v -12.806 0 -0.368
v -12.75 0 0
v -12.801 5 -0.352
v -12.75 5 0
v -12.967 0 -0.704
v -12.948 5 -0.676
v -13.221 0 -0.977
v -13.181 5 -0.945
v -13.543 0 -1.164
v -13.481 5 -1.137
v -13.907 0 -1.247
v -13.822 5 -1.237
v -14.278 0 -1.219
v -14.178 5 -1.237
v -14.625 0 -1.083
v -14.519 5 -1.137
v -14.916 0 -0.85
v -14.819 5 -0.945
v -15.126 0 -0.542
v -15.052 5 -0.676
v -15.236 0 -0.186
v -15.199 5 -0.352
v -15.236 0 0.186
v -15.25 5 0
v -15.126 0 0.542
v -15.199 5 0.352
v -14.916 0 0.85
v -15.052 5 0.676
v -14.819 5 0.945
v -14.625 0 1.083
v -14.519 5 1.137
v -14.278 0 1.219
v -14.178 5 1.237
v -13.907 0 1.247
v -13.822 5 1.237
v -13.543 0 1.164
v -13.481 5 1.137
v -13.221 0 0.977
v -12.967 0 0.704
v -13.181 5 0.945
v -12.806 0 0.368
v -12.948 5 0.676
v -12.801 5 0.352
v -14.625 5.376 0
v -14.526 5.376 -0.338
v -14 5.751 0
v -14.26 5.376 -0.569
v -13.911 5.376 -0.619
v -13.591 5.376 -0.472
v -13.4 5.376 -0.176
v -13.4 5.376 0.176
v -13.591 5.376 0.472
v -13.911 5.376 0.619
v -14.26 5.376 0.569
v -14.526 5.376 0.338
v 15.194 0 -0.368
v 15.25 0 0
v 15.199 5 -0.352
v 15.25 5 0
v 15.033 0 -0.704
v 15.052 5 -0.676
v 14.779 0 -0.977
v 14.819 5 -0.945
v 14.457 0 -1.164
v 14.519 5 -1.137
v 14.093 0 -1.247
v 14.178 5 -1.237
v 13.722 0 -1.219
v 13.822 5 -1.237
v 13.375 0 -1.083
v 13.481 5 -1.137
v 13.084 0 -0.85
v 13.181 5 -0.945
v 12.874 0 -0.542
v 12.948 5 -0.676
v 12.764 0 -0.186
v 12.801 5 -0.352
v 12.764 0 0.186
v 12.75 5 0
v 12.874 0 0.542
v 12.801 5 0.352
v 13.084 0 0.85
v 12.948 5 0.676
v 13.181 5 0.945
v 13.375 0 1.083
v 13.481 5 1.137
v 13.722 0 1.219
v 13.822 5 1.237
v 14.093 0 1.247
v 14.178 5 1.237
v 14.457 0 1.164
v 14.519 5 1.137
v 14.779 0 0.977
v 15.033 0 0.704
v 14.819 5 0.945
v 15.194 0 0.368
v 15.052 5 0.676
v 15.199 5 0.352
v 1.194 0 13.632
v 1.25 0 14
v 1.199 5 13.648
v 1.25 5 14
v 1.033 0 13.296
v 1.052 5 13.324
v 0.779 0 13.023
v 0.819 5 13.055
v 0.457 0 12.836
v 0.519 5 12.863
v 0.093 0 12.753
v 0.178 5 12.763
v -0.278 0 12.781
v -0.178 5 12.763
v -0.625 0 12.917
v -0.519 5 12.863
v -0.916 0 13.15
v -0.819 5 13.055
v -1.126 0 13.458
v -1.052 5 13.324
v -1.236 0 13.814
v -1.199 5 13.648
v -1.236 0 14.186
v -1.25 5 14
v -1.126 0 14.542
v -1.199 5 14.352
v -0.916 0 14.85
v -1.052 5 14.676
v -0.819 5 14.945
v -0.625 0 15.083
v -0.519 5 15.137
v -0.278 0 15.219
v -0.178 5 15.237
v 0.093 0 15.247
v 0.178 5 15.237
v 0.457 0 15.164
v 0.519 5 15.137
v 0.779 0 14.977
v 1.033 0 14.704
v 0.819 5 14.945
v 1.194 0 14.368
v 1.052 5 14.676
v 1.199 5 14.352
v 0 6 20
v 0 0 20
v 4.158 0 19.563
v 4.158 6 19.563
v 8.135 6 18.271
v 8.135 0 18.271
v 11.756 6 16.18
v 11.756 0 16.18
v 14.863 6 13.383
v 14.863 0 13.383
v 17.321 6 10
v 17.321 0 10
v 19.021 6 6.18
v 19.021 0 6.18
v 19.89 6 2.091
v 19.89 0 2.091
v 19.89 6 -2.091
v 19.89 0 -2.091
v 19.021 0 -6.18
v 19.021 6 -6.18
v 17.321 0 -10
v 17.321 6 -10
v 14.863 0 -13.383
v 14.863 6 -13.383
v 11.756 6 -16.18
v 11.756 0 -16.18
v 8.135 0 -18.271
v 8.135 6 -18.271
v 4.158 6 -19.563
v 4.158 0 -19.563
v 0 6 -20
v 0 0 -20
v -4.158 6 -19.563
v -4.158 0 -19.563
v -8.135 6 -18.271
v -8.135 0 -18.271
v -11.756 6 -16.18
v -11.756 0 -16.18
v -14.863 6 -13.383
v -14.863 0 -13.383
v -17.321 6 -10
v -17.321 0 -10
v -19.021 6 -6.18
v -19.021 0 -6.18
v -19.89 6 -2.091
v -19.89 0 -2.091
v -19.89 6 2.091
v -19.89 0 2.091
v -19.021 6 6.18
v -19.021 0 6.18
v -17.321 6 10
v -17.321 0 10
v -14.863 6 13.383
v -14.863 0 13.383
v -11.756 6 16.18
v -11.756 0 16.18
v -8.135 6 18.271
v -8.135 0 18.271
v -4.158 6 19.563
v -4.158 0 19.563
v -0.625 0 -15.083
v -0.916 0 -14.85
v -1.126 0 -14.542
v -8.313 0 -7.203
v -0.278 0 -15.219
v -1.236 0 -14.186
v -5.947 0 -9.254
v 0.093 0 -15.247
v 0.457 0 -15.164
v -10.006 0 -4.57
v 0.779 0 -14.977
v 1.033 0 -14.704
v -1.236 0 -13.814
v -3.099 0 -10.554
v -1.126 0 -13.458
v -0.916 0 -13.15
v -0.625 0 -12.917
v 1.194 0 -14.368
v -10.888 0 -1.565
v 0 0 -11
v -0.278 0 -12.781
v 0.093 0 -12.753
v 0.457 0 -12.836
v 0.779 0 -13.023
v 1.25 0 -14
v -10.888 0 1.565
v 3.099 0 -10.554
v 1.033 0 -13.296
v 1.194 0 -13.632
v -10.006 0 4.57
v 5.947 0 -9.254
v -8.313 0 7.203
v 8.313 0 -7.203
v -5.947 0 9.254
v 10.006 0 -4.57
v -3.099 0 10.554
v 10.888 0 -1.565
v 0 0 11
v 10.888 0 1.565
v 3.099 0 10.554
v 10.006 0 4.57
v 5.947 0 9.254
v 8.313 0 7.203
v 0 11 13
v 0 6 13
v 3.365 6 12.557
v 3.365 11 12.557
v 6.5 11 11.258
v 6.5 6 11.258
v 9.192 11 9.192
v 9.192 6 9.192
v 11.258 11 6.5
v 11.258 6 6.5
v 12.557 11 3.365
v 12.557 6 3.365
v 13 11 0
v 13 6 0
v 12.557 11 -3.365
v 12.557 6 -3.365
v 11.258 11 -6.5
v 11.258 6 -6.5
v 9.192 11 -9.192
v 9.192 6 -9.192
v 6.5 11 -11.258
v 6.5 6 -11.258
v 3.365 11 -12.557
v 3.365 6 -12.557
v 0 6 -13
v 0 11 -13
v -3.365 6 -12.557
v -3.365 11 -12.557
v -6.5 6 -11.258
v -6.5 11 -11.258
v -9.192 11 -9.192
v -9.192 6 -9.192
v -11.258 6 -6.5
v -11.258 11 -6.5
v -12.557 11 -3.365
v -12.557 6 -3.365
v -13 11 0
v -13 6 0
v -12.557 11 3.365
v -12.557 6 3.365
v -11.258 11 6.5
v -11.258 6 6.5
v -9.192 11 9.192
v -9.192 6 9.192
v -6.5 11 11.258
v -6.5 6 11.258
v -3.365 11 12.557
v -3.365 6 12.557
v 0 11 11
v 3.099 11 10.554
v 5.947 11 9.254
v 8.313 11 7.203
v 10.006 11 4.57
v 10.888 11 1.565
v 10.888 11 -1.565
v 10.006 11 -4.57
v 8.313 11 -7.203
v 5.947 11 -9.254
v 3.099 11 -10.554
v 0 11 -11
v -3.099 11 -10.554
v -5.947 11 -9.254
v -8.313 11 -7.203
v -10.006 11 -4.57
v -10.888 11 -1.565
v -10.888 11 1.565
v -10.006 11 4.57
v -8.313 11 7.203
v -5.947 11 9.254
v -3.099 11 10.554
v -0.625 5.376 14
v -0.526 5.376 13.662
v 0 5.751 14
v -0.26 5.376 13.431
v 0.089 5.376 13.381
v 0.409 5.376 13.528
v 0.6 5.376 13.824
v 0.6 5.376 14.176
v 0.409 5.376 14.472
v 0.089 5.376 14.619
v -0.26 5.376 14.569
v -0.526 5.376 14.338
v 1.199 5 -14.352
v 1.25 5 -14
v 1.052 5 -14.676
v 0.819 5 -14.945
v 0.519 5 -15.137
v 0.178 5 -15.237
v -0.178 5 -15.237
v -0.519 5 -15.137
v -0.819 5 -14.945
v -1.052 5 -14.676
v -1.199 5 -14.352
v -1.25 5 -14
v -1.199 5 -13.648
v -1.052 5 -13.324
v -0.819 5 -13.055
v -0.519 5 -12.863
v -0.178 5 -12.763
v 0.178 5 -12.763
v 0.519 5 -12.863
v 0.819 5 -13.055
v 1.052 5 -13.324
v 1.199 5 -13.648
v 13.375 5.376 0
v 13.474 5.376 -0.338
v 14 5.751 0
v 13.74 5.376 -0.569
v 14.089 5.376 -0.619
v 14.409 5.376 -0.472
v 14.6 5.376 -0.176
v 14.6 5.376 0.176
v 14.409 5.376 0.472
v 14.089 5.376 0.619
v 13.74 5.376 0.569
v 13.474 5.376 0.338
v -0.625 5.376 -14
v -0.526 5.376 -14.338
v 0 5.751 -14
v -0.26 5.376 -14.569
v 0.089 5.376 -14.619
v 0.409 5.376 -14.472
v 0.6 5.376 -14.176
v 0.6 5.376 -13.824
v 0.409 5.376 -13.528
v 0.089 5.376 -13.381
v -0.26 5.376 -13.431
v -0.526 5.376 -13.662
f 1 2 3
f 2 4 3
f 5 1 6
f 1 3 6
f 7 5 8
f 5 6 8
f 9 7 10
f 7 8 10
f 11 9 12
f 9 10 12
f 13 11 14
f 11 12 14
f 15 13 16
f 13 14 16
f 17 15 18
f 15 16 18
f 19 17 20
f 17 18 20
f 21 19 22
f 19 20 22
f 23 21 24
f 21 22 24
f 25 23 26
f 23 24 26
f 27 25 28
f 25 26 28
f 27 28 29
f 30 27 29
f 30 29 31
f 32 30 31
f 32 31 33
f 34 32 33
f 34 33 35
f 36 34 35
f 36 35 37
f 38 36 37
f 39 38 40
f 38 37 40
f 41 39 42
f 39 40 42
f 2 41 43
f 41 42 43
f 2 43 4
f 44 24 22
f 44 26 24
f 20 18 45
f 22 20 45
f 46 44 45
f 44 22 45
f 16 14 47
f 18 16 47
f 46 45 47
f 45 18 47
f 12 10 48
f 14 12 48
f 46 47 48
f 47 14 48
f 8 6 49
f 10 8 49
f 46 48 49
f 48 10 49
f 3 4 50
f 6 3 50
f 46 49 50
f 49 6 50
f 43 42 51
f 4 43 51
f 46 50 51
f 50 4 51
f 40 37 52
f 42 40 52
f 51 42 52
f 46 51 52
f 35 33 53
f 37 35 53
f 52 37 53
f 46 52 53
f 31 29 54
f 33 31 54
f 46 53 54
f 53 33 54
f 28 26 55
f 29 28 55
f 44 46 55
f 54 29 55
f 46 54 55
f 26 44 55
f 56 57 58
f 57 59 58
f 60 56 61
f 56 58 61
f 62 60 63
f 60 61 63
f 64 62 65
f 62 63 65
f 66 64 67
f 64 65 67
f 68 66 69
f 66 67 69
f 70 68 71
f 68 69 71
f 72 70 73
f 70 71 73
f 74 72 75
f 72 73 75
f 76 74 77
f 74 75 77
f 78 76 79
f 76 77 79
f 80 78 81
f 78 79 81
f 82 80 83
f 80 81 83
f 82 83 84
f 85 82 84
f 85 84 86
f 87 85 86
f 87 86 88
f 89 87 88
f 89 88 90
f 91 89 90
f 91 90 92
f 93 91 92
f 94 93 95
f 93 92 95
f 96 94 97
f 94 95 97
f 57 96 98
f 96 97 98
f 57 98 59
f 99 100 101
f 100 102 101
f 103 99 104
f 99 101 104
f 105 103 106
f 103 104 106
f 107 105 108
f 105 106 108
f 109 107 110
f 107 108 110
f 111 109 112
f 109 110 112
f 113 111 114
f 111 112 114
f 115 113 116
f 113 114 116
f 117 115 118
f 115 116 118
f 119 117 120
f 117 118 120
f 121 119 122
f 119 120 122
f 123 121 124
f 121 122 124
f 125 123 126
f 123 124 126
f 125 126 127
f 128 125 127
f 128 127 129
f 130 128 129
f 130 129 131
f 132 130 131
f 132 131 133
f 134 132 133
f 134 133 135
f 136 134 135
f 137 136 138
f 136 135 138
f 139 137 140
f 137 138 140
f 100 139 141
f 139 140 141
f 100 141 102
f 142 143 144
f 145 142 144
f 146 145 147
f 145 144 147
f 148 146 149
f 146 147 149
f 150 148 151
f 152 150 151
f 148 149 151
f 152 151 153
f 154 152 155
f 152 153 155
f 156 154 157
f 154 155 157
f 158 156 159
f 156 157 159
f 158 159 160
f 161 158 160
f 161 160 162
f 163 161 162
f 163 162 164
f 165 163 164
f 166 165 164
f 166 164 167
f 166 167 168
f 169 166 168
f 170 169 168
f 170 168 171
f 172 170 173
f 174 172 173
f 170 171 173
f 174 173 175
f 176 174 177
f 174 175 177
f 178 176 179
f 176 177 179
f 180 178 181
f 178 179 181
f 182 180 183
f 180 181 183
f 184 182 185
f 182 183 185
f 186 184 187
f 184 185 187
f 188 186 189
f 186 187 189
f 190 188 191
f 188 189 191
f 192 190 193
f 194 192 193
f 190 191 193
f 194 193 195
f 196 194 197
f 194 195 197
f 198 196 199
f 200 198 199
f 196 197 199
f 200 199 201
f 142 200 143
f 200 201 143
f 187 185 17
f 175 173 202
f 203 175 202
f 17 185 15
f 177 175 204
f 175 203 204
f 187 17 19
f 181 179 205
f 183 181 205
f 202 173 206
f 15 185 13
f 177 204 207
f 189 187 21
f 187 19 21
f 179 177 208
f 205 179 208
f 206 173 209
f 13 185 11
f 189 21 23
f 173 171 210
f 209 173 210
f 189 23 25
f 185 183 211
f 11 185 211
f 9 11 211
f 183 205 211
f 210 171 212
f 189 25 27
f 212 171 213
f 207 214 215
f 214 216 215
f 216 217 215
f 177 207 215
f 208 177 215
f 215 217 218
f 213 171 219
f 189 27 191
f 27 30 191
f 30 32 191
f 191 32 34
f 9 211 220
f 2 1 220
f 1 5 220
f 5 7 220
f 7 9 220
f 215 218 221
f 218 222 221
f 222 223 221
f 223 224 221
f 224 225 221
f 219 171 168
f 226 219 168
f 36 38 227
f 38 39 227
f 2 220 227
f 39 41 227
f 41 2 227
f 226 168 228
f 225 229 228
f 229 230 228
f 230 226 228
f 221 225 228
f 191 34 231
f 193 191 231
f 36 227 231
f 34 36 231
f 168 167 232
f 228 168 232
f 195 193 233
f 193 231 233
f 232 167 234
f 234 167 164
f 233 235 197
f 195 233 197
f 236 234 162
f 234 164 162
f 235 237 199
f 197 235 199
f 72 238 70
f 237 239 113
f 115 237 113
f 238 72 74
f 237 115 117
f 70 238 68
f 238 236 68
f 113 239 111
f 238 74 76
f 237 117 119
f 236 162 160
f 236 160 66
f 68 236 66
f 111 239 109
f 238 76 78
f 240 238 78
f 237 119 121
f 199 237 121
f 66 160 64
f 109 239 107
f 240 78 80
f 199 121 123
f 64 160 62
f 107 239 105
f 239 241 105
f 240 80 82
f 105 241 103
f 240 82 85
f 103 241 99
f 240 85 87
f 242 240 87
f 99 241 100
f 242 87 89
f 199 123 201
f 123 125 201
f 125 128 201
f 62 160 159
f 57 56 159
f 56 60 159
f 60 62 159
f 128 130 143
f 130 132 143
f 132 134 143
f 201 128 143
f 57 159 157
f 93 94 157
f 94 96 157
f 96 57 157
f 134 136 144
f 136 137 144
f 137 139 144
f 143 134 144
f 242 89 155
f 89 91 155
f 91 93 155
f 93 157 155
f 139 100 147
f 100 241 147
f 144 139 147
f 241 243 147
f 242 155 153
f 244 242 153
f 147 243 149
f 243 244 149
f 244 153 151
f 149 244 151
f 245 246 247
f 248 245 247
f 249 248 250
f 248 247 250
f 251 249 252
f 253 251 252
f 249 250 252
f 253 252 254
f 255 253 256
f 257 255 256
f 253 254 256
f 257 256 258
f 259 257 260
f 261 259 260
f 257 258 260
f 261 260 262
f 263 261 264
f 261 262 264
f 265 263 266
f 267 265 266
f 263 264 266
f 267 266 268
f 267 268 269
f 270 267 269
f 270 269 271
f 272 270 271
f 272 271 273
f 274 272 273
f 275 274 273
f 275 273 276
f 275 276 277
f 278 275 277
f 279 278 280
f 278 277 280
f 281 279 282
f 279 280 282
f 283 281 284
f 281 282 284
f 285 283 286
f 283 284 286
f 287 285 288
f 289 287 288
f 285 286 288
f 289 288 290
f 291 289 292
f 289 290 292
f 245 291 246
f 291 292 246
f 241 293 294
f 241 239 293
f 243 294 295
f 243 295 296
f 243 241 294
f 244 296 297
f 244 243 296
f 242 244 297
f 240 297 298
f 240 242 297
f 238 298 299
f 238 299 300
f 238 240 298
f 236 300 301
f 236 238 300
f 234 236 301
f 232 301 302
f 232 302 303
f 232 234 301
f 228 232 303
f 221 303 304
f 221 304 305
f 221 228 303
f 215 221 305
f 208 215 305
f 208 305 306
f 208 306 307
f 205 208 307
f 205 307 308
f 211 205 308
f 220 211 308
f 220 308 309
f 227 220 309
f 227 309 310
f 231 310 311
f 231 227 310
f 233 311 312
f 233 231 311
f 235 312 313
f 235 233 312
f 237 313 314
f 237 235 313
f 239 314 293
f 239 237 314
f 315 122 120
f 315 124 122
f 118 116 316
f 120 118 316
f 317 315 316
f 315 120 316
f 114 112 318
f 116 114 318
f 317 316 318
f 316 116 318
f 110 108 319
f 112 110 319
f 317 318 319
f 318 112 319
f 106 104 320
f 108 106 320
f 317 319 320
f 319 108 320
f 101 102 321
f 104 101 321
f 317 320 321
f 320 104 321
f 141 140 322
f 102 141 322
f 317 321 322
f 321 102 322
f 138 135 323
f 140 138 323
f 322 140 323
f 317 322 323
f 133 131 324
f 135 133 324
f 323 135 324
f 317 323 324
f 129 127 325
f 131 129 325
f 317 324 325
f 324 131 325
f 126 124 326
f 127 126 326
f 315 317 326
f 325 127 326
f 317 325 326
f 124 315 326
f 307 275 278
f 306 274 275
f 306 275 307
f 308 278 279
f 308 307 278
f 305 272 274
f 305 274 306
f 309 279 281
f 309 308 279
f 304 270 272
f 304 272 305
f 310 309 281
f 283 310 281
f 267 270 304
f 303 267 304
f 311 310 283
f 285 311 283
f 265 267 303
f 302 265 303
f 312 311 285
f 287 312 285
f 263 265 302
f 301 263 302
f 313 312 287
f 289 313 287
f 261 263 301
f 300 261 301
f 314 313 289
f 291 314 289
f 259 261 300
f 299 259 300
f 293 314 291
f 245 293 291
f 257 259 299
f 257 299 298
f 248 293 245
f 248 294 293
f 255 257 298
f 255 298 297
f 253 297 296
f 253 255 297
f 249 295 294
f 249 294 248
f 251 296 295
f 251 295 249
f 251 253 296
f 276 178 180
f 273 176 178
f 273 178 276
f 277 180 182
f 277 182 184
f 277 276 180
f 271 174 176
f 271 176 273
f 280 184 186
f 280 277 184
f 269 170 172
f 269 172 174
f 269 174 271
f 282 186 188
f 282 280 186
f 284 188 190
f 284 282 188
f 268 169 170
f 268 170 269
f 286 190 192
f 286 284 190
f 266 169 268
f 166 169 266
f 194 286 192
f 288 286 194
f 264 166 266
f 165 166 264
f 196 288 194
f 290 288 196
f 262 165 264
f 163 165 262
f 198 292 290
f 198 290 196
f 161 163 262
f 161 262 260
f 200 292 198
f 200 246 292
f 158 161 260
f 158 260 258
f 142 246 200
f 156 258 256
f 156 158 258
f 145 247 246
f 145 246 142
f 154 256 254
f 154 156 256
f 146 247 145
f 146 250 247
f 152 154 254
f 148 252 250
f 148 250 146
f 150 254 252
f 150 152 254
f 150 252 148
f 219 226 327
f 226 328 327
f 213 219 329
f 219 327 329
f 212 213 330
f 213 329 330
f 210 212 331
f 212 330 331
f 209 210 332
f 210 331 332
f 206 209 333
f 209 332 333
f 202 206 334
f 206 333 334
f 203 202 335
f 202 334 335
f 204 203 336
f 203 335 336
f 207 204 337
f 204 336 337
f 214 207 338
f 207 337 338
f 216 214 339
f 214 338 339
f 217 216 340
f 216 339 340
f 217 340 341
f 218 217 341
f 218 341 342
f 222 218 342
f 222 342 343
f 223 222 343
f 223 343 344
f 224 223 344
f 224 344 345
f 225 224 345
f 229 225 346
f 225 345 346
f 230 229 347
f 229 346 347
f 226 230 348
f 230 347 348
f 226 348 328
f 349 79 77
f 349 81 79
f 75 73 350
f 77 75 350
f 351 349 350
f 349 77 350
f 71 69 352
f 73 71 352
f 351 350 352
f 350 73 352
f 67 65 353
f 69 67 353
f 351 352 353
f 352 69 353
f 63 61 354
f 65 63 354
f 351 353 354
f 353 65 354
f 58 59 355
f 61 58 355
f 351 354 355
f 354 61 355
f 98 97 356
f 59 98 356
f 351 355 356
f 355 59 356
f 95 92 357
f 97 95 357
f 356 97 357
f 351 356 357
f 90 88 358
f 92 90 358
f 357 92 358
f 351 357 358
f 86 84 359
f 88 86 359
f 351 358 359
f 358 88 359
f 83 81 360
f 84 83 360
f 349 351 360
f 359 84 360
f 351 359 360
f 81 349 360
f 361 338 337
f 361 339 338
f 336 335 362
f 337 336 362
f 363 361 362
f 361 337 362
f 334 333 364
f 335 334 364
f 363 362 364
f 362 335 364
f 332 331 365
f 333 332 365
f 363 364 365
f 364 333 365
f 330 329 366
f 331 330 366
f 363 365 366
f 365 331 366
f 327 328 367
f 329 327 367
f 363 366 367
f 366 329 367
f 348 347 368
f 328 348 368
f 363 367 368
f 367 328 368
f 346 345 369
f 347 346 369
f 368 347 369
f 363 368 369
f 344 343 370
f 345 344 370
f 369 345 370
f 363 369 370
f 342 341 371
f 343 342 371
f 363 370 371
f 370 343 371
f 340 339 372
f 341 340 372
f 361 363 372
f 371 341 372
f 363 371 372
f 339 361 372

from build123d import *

# Parameters (mm, degrees)
SKETCH_1_R             = 20
SKETCH_1_R_2           = 11
EXTRUDE_1_DEPTH        = 6
SKETCH_2_R             = 13
SKETCH_2_R_2           = 11
EXTRUDE_2_DEPTH        = 5
HOLE_WIZARD_M3_1_D     = 2.5
HOLE_WIZARD_M3_1_DEPTH = 5
HOLE_WIZARD_M3_1_TIP   = 0.751075774


with BuildPart() as part:
    # 草图1 → 凸台-拉伸1 (new body)
    with BuildSketch(Plane(origin=(0, 0, 0), x_dir=(1, 0, 0), z_dir=(0, 1, 0))):
        with Locations(Location((0, 0, 0), (0, 0, 270))):
            Circle(SKETCH_1_R)
        with Locations(Location((0, 0, 0), (0, 0, 270))):
            Circle(SKETCH_1_R_2, mode=Mode.SUBTRACT)
    extrude(amount=EXTRUDE_1_DEPTH)

    # 草图2 → 凸台-拉伸2 (add)
    with BuildSketch(Plane(origin=(0, 6, 0), x_dir=(1, 0, 0), z_dir=(0, 1, 0))):
        with Locations(Location((0, 0, 0), (0, 0, 270))):
            Circle(SKETCH_2_R)
        with Locations(Location((0, 0, 0), (0, 0, 270))):
            Circle(SKETCH_2_R_2, mode=Mode.SUBTRACT)
    extrude(amount=EXTRUDE_2_DEPTH)

    # M3 螺纹孔1
    with Locations(Plane(origin=(0, 0, 0), x_dir=(-1, 0, 0), z_dir=(0, -1, 0))):
        with Locations((-14, 0), (0, -14), (14, 0), (0, 14)):
            Hole(HOLE_WIZARD_M3_1_D / 2, depth=HOLE_WIZARD_M3_1_DEPTH)
            with Locations((0, 0, -(HOLE_WIZARD_M3_1_DEPTH + HOLE_WIZARD_M3_1_TIP / 2))):  # 118° drill point
                Cone(0, HOLE_WIZARD_M3_1_D / 2, HOLE_WIZARD_M3_1_TIP, mode=Mode.SUBTRACT)


solid = part.part
